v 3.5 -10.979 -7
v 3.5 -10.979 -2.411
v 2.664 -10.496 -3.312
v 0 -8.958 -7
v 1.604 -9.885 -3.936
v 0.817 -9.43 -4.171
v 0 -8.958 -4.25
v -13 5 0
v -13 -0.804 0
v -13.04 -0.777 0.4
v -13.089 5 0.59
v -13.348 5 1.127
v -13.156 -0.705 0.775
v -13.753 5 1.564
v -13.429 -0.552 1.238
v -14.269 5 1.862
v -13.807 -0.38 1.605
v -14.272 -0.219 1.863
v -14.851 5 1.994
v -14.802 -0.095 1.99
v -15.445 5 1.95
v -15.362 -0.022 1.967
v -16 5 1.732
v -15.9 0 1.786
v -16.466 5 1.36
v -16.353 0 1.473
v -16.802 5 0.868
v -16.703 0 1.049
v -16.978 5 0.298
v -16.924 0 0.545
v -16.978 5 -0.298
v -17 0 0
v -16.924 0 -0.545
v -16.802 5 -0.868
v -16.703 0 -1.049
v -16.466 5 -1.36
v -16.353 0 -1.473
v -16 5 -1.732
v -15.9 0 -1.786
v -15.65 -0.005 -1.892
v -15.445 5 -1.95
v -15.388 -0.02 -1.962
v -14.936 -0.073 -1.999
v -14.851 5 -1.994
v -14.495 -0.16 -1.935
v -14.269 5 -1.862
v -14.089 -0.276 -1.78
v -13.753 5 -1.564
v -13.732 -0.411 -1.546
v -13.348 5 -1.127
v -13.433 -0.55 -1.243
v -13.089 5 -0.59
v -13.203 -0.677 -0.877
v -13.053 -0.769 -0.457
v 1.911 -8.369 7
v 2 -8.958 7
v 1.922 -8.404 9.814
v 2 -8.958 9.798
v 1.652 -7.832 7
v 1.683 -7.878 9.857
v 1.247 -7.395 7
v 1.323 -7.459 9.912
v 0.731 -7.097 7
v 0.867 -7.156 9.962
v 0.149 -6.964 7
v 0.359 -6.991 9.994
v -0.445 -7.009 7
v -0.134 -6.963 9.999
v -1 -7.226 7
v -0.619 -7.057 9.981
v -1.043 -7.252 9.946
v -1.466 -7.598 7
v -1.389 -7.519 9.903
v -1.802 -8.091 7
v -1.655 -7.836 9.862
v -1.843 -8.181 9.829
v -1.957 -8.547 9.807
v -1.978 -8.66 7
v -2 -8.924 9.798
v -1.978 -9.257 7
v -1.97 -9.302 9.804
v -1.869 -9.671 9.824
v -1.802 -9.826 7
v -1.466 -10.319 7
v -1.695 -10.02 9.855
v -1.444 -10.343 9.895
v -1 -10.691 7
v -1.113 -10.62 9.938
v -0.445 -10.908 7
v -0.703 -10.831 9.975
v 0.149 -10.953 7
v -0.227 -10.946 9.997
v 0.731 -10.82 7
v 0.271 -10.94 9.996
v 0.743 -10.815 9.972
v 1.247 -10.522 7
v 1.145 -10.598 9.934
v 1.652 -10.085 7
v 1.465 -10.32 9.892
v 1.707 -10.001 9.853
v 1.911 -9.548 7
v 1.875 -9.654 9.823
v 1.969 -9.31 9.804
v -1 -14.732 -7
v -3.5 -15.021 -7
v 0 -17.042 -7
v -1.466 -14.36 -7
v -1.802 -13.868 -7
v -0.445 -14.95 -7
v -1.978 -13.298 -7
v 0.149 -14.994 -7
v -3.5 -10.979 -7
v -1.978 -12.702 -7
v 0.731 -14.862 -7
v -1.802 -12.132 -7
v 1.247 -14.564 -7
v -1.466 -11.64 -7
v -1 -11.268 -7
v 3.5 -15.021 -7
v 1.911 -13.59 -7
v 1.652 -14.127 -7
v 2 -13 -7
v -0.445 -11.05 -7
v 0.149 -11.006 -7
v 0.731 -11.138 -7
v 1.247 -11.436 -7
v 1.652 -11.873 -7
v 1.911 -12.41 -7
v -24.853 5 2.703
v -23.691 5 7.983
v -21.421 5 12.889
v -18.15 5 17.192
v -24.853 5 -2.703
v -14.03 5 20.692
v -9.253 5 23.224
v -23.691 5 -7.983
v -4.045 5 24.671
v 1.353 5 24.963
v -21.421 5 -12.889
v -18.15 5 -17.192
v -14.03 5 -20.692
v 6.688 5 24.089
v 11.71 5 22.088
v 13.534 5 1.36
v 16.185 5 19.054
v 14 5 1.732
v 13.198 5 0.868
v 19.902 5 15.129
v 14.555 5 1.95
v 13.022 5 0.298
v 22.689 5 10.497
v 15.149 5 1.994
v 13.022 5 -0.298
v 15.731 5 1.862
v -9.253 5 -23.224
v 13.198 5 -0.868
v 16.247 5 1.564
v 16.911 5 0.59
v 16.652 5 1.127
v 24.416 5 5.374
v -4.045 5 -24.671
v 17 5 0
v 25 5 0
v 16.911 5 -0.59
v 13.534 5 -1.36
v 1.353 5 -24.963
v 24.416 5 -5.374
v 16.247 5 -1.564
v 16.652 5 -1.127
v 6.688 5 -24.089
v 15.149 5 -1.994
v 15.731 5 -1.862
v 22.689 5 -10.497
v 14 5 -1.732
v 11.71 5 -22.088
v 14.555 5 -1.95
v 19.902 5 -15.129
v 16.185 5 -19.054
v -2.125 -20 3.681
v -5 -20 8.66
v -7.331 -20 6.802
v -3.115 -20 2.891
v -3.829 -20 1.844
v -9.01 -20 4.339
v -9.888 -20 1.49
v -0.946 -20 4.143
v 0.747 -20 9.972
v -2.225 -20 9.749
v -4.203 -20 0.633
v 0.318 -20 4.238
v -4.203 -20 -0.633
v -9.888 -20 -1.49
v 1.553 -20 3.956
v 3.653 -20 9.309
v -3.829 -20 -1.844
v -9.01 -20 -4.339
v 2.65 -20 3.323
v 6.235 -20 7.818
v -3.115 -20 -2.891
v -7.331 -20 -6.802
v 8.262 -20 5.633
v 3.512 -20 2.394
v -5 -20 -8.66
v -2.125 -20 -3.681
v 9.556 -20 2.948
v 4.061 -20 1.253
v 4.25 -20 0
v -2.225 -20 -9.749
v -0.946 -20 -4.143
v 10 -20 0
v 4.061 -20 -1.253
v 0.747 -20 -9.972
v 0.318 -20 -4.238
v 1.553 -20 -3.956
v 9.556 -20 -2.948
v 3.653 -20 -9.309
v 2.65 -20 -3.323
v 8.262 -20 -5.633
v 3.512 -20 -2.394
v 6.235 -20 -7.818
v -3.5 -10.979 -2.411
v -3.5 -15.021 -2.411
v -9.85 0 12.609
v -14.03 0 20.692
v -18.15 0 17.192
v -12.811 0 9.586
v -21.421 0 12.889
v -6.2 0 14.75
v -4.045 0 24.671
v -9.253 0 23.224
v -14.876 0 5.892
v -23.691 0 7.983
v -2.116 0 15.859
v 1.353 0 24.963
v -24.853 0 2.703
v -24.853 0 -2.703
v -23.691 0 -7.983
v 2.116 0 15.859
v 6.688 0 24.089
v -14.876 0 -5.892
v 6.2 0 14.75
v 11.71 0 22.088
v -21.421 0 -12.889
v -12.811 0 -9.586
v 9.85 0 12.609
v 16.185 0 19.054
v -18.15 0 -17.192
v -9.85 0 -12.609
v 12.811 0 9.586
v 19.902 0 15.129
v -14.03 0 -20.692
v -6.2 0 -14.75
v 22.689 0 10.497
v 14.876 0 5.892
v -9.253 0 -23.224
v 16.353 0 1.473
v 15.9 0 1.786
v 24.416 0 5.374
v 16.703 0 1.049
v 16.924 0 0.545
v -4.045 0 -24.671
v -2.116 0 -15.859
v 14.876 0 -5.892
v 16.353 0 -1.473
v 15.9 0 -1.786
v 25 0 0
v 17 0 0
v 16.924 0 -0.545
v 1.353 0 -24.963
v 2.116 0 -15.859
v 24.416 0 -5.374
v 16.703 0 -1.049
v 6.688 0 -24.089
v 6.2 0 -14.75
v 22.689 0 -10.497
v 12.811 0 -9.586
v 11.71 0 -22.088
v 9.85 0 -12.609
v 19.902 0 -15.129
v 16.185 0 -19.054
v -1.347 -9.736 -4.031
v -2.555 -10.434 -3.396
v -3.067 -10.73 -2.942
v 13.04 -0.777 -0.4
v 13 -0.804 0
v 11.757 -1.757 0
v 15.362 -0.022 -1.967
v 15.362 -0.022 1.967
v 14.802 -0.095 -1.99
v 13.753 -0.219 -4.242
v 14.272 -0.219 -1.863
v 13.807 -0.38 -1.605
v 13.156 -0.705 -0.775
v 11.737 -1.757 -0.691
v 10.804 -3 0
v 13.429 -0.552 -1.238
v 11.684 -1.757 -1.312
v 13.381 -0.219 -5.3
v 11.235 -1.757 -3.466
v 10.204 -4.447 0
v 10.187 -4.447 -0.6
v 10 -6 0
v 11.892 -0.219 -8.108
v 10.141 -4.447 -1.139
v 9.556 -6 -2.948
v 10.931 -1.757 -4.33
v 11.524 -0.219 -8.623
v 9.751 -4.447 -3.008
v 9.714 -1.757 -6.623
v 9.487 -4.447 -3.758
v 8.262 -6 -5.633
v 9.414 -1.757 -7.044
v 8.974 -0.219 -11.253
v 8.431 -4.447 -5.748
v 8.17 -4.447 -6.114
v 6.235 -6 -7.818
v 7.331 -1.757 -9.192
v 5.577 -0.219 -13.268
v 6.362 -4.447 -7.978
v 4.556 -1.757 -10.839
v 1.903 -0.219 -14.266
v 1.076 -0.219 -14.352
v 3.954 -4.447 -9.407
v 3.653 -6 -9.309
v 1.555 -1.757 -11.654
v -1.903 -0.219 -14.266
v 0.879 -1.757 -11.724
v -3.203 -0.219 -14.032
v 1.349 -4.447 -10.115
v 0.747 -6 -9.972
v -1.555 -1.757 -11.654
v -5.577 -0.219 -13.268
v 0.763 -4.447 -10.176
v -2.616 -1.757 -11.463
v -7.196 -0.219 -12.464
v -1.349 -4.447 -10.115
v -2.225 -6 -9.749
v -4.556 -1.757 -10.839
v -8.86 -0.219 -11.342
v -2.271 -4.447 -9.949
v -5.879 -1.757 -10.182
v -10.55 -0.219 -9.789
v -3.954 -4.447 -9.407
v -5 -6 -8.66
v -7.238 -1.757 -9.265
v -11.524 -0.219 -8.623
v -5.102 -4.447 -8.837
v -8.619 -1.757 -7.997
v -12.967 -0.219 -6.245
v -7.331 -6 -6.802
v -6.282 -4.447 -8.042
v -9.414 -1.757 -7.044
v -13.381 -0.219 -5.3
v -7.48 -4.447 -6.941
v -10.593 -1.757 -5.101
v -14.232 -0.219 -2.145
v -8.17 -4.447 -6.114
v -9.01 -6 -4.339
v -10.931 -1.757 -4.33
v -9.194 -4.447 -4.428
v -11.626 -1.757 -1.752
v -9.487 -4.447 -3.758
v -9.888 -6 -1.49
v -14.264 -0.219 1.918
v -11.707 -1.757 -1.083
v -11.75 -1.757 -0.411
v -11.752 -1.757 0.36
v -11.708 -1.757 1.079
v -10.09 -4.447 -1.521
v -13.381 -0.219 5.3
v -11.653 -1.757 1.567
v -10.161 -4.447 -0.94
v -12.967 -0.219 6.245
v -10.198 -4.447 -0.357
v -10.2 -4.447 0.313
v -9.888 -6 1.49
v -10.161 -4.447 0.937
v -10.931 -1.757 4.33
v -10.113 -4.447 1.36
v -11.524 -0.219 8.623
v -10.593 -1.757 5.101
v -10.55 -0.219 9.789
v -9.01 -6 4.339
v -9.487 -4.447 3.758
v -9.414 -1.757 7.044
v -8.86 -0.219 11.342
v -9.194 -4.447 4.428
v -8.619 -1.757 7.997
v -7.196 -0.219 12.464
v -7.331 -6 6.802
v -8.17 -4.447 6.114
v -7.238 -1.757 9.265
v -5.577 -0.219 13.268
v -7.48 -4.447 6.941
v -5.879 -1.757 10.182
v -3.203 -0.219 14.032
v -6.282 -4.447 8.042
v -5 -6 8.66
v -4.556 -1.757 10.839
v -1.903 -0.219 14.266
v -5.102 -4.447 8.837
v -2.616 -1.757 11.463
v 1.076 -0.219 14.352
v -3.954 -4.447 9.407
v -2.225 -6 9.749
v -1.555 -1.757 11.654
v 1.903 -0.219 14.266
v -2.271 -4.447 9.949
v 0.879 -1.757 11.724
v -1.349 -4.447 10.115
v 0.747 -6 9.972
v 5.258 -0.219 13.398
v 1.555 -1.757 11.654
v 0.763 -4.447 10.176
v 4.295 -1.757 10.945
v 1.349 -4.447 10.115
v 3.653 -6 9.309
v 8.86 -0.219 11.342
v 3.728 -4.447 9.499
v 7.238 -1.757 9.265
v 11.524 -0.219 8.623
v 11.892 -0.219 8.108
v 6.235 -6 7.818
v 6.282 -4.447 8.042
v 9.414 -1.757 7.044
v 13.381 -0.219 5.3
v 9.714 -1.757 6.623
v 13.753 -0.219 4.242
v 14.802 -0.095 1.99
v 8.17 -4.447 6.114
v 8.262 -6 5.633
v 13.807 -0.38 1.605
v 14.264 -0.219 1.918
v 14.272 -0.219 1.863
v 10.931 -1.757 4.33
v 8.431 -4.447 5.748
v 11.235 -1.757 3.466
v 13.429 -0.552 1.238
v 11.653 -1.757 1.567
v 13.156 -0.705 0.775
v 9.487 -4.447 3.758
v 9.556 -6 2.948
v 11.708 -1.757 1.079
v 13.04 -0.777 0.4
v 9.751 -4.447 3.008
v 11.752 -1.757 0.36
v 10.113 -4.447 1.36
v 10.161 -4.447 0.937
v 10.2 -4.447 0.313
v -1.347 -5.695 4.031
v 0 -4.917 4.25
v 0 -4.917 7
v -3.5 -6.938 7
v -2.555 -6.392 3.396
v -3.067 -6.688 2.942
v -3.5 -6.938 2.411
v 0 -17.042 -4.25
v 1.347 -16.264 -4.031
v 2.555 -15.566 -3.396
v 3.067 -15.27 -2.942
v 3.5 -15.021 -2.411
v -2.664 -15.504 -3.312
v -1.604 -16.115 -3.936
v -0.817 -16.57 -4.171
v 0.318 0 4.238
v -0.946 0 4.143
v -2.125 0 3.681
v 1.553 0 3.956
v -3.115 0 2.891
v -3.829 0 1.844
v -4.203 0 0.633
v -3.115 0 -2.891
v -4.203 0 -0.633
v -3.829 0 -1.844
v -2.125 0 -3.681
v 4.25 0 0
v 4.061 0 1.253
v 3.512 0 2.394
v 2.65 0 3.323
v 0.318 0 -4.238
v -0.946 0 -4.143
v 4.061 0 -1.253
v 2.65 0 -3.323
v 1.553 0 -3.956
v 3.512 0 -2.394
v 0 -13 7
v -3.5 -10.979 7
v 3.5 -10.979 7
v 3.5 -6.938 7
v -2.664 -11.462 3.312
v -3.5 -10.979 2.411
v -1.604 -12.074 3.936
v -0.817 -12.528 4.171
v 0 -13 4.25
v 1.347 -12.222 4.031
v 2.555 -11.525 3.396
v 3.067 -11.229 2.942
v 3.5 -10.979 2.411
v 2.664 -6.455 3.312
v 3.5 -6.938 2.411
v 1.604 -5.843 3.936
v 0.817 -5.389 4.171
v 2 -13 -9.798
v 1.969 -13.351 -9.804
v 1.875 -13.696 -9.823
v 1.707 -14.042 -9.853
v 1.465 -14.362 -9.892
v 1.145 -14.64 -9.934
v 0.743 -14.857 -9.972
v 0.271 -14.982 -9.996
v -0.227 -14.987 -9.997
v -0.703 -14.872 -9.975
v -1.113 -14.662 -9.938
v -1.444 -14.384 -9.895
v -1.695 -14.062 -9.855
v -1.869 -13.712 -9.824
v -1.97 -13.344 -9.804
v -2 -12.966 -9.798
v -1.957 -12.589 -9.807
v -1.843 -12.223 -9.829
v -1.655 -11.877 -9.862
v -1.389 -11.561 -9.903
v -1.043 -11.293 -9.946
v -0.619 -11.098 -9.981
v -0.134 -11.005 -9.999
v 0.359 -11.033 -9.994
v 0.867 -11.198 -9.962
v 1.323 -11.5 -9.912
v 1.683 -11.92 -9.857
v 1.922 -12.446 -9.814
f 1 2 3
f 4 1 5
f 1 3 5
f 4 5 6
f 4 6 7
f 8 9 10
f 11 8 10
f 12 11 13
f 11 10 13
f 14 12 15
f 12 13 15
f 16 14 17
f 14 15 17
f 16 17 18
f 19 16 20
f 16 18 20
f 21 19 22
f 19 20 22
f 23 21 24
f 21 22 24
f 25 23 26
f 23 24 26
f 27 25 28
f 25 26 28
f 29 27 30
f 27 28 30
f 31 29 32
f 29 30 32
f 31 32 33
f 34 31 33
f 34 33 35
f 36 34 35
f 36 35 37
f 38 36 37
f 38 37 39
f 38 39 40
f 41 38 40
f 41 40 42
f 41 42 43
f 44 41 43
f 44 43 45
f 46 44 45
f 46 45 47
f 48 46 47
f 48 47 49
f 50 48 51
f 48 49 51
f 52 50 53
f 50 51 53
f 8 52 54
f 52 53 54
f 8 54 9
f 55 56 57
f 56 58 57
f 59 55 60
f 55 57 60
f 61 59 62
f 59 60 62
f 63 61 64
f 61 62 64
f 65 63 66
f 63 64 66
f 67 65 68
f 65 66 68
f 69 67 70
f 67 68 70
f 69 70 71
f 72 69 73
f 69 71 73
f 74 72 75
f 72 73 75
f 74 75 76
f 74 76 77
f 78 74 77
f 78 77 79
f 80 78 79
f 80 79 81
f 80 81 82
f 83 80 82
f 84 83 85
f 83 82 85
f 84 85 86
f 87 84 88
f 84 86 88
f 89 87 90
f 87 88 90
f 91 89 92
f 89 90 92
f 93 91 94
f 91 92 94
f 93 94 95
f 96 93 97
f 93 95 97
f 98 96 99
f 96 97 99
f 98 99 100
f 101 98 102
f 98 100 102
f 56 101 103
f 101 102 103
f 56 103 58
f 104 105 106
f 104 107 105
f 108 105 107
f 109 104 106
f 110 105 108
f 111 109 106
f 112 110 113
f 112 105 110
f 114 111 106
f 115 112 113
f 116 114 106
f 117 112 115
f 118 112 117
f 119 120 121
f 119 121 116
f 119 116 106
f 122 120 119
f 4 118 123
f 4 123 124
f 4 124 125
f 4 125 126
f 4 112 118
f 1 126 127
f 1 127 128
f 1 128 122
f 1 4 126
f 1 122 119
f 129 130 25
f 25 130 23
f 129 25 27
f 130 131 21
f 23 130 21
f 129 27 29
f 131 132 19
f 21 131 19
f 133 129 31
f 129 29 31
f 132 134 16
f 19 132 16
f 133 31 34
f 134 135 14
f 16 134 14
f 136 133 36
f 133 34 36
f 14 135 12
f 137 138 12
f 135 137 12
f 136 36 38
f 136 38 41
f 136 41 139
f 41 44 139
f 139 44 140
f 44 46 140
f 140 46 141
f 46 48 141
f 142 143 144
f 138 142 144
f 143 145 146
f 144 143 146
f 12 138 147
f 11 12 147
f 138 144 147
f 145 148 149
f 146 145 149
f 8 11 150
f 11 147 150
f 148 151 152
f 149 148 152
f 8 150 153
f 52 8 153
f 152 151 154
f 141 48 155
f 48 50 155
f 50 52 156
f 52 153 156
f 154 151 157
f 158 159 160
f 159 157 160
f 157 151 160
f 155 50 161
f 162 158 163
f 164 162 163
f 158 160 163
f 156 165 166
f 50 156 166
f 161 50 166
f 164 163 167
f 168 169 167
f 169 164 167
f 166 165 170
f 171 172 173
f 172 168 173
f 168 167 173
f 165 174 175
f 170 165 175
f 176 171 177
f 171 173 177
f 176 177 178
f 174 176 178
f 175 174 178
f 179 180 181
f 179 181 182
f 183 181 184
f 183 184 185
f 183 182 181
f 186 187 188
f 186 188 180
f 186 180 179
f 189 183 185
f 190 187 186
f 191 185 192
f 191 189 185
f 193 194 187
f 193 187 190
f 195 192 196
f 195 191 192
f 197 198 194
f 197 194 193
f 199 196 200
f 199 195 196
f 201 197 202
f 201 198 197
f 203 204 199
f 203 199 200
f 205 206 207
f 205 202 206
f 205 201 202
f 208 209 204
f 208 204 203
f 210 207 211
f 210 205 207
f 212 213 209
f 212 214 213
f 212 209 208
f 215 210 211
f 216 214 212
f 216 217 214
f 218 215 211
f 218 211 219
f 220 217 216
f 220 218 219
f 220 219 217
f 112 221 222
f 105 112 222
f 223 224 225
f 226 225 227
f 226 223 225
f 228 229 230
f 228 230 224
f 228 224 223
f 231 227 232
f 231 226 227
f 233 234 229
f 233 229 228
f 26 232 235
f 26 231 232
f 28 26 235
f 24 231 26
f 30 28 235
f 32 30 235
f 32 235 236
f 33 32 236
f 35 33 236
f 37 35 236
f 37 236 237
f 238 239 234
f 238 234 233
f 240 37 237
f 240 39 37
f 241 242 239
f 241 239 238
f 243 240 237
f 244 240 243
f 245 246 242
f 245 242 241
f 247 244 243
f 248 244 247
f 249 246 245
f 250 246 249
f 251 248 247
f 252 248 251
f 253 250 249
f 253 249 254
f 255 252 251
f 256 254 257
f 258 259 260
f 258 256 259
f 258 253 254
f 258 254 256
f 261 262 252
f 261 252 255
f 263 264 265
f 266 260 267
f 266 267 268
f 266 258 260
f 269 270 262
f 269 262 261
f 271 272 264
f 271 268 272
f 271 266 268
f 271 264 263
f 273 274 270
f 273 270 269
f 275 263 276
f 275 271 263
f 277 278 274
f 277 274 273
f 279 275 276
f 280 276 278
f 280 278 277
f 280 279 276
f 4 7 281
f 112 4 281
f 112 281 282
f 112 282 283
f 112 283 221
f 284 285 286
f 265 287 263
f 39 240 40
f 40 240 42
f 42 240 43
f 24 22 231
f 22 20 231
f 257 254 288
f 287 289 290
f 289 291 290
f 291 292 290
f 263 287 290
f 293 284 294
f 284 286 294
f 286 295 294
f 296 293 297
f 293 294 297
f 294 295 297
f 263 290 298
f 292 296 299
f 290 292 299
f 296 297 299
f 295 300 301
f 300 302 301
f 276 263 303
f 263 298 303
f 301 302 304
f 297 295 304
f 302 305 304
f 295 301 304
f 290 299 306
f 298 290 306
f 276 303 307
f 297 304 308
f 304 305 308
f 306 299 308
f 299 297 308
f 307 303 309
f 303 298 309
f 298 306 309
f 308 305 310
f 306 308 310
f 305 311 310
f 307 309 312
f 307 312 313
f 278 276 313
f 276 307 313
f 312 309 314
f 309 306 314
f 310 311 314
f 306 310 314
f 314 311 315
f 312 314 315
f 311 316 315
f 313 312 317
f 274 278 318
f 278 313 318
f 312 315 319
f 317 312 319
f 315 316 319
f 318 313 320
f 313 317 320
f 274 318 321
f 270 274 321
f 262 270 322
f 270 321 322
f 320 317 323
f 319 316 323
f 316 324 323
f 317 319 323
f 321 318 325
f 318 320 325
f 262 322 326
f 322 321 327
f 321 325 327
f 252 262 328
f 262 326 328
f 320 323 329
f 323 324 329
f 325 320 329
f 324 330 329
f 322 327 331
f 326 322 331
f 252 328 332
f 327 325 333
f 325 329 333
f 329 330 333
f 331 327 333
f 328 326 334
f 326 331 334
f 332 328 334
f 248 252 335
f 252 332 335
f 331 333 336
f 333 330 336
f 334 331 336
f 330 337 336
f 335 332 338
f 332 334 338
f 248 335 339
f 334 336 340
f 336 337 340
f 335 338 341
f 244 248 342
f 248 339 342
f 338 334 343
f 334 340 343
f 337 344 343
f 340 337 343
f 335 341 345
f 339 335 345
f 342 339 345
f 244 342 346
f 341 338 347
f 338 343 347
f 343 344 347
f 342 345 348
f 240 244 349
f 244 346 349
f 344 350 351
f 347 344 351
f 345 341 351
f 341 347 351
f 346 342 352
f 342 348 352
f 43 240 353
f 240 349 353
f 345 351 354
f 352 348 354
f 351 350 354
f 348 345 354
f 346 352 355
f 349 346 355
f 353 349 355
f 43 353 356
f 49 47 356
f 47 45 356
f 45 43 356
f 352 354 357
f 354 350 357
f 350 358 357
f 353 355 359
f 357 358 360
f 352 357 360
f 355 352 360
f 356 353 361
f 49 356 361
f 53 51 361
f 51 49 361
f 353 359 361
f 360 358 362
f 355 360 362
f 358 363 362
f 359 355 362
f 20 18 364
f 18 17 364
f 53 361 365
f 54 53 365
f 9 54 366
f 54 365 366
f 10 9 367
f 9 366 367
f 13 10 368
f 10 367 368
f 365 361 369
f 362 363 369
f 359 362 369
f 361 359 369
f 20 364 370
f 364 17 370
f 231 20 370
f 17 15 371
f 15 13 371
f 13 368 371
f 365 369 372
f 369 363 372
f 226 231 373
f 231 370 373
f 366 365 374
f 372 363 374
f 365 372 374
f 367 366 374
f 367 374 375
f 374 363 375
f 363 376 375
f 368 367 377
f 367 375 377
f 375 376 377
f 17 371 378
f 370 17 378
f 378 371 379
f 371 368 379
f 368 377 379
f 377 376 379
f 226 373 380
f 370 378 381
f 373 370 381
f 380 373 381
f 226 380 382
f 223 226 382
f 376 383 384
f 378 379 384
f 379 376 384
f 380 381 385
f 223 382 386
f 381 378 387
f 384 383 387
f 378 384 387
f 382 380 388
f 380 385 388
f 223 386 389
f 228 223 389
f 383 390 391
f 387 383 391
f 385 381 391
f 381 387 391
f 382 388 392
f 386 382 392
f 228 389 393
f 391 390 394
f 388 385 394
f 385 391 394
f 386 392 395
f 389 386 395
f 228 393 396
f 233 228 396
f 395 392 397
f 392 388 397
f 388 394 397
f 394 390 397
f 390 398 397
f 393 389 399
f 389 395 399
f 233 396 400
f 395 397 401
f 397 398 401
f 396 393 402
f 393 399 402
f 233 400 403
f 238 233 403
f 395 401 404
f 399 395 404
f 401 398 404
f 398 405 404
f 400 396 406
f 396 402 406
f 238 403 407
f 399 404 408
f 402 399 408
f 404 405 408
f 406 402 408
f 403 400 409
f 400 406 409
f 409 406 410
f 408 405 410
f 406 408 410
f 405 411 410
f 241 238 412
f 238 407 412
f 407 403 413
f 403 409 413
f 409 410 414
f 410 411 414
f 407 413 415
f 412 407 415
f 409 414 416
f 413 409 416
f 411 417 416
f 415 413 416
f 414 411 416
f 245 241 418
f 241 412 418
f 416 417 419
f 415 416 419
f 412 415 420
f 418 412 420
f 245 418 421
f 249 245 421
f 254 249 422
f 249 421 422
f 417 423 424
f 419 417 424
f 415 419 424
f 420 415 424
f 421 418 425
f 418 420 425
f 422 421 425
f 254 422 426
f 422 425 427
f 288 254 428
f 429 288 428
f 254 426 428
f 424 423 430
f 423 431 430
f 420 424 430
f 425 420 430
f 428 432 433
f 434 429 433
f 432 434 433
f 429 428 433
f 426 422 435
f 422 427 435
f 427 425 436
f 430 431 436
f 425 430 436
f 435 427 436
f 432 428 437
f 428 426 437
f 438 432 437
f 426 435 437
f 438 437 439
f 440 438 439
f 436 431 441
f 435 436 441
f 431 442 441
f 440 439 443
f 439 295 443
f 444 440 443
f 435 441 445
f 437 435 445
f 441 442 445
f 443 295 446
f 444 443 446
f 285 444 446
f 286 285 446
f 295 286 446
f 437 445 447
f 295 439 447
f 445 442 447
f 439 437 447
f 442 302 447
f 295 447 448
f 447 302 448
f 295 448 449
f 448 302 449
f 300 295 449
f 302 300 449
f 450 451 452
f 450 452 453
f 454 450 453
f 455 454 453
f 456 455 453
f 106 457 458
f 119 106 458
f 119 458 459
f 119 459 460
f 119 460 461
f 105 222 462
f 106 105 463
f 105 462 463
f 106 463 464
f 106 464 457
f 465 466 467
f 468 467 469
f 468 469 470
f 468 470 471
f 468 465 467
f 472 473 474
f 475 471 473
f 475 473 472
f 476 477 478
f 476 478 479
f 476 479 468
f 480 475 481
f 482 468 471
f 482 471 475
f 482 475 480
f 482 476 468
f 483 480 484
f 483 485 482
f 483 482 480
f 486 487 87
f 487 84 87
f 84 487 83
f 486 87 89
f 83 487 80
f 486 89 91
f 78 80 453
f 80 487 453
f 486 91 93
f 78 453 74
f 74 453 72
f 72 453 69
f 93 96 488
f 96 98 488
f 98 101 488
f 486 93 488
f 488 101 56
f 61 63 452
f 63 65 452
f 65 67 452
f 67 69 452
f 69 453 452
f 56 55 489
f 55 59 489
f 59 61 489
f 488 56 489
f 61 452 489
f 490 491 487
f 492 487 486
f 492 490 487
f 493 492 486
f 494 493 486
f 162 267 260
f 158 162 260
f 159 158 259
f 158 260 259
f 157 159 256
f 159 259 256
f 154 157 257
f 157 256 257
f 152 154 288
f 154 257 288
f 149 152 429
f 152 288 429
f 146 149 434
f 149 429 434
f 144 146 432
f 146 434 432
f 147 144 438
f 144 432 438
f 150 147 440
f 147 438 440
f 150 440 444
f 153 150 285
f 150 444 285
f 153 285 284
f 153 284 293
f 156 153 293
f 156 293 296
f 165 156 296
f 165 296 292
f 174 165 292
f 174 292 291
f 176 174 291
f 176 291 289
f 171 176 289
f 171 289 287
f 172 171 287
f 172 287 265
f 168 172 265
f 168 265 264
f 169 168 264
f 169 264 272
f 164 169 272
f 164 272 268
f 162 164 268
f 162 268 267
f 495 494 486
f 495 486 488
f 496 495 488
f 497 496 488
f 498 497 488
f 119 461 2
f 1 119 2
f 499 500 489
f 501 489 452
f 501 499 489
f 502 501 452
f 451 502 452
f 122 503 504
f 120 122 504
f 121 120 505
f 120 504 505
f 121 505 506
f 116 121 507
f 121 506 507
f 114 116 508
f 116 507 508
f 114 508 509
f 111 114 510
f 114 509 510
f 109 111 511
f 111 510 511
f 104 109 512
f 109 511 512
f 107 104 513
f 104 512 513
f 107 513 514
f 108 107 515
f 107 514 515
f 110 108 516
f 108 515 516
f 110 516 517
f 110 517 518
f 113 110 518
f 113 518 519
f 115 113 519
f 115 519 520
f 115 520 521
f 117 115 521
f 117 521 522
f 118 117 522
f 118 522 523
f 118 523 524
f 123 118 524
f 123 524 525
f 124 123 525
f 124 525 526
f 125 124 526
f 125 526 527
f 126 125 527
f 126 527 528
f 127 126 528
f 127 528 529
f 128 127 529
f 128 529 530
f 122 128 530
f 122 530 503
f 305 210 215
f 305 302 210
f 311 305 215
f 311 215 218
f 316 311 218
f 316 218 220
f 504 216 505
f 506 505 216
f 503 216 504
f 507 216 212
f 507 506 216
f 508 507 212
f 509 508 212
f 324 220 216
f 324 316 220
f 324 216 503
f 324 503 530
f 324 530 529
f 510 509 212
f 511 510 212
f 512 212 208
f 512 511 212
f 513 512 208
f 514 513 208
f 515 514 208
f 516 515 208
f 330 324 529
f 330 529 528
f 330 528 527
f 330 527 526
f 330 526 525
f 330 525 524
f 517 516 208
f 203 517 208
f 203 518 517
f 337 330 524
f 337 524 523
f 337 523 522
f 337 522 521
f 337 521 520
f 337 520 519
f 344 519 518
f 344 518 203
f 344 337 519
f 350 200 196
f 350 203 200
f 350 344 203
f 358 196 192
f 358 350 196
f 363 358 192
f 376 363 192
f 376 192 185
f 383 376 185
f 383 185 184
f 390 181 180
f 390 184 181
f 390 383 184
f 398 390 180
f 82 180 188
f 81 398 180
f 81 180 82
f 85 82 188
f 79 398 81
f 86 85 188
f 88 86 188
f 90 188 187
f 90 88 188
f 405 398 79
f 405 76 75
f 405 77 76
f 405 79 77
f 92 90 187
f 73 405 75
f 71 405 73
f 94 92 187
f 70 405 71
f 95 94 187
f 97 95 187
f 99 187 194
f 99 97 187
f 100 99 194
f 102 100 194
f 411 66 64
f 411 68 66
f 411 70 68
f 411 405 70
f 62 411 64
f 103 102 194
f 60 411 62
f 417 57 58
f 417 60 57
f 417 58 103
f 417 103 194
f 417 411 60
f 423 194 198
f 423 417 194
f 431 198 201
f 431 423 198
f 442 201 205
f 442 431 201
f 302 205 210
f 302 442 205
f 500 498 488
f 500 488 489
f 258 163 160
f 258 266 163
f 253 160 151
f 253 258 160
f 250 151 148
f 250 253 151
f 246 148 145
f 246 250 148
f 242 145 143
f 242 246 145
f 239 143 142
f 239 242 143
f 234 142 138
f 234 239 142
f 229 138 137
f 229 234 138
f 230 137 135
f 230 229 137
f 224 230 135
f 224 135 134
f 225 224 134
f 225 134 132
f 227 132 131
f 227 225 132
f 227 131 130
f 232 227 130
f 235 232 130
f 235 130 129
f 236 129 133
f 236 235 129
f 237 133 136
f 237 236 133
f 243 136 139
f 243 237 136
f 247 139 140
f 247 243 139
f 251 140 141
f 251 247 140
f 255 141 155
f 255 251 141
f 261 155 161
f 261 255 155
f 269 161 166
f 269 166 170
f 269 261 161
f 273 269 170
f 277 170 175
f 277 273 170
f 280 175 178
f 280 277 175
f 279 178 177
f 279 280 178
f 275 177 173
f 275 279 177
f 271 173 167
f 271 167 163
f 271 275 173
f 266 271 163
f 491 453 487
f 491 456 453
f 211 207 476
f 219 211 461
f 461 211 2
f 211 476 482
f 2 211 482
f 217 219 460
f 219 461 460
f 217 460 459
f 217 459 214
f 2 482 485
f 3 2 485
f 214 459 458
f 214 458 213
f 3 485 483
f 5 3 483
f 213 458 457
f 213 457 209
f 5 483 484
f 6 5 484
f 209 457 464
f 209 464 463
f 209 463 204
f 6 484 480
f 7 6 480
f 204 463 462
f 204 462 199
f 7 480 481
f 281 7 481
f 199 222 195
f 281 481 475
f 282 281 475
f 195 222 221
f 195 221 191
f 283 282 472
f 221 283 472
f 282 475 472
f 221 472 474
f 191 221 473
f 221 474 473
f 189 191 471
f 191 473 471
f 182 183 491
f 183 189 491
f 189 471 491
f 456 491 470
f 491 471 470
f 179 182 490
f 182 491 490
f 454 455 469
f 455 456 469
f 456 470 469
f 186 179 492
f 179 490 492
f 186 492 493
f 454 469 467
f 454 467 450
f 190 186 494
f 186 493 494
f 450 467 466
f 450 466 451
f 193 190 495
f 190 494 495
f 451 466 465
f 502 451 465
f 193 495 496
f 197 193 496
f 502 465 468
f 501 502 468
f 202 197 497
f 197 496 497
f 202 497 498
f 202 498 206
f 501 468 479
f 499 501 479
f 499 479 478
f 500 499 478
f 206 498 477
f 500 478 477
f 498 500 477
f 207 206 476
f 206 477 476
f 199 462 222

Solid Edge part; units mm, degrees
sketch "Sketch1" plane through (0, 0, 0) normal (0, -1, 0) x (1, 0, 0)
  circle A0 centre (0, 0) radius 10
  circle A1 centre (0, 0) radius 4.25
extrude "Protrusion1" add sketch "Sketch1" along normal blind 20
sketch "Sketch2" plane through (0, 0, 0) normal (0, -1, 0) x (1, 0, 0)
  circle A0 centre (-15, 0) radius 2
  circle A1 centre (0, 0) radius 25
  circle A2 centre (15, 0) radius 2
extrude "ExtrudedProtrusion_3" add sketch "Sketch2" against normal blind 5
fillet "Round_2" radius 6 1 edges at (-10, 0, 0)
sketch "Sketch3" plane through (0, 0, 0) normal (0, 0, 1) x (1, 0, 0)
  line L0 (-3.5, -10.9793) -> (-3.5, -15.0207)
  line L1 (-3.5, -15.0207) -> (0, -17.0415)
  line L2 (0, -17.0415) -> (3.5, -15.0207)
  line L3 (3.5, -15.0207) -> (3.5, -10.9793)
  line L4 (3.5, -10.9793) -> (0, -8.9585)
  line L5 (0, -8.9585) -> (-3.5, -10.9793)
extrude "ExtrudedCutout_3" cut sketch "Sketch3" against normal blind 7
sketch "Sketch4" plane through (0, 0, 0) normal (0, 0, 1) x (1, 0, 0)
  line L0 (0, -13) -> (3.5, -10.9793)
  line L1 (3.5, -10.9793) -> (3.5, -6.9378)
  line L2 (3.5, -6.9378) -> (0, -4.9171)
  line L3 (0, -4.9171) -> (-3.5, -6.9378)
  line L4 (-3.5, -6.9378) -> (-3.5, -10.9793)
  line L5 (-3.5, -10.9793) -> (0, -13)
extrude "ExtrudedCutout_4" cut sketch "Sketch4" along normal blind 7
sketch "Sketch5" plane through (0, 0, -11) normal (0, 0, 1) x (1, 0, 0)
  circle A0 centre (0, -13) radius 2
extrude "ExtrudedCutout_5" cut sketch "Sketch5" along normal blind 8
sketch "Sketch6" plane through (0, 0, 11) normal (0, 0, 1) x (1, 0, 0)
  circle A0 centre (0, -8.9585) radius 2
extrude "ExtrudedCutout_6" cut sketch "Sketch6" against normal blind 8
